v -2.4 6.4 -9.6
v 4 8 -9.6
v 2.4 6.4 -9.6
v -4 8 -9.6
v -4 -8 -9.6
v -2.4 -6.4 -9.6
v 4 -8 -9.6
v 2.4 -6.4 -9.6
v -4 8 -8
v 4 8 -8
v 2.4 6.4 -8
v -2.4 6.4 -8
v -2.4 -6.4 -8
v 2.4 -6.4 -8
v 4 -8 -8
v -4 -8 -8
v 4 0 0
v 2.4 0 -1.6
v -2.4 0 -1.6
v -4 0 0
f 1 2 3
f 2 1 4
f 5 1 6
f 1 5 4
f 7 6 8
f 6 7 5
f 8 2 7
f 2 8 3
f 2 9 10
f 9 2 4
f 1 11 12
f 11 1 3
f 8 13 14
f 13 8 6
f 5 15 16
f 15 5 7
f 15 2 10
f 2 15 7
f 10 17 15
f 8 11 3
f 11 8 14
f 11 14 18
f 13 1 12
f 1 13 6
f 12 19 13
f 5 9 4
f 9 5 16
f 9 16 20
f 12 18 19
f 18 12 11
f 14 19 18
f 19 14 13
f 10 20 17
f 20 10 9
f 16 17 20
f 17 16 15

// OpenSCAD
// file: ../p/4-4edge.scad
use <../lib.scad>
$fa=1; $fs=0.2;
function ldraw_lib__4_4edge(realsolid=false) = [
// 0 Circle 1.0
// 0 Name: 4-4edge.dat
// 0 Author: James Jessiman
// 0 !LDRAW_ORG Primitive UPDATE 2017-01
// 0 !LICENSE Licensed under CC BY 2.0 and CC BY 4.0 : see CAreadme.txt
// 
// 0 BFC CERTIFY CCW
  [0,"BFC","CERTIFY"],
  [0,"BFC","CCW"],
// 
// 0 !HISTORY 1998-12-15 [PTadmin] Official Update 1998-10
// 0 !HISTORY 2005-12-28 [PTadmin] Official Update 2005-01
// 0 !HISTORY 2007-06-24 [PTadmin] Header formatted for Contributor Agreement
// 0 !HISTORY 2008-07-01 [PTadmin] Official Update 2008-01
// 0 !HISTORY 2017-01-15 [Steffen] BFCed
// 0 !HISTORY 2017-12-30 [PTadmin] Official Update 2017-01
// 
// 
// 2 24 1 0 0 0.9239 0 0.3827
  [2,24,1,0,0,0.9239,0,0.3827],
// 2 24 0.9239 0 0.3827 0.7071 0 0.7071
  [2,24,0.9239,0,0.3827,0.7071,0,0.7071],
// 2 24 0.7071 0 0.7071 0.3827 0 0.9239
  [2,24,0.7071,0,0.7071,0.3827,0,0.9239],
// 2 24 0.3827 0 0.9239 0 0 1
  [2,24,0.3827,0,0.9239,0,0,1],
// 2 24 0 0 1 -0.3827 0 0.9239
  [2,24,0,0,1,-0.3827,0,0.9239],
// 2 24 -0.3827 0 0.9239 -0.7071 0 0.7071
  [2,24,-0.3827,0,0.9239,-0.7071,0,0.7071],
// 2 24 -0.7071 0 0.7071 -0.9239 0 0.3827
  [2,24,-0.7071,0,0.7071,-0.9239,0,0.3827],
// 2 24 -0.9239 0 0.3827 -1 0 -0
  [2,24,-0.9239,0,0.3827,-1,0,-0],
// 2 24 -1 0 -0 -0.9239 0 -0.3827
  [2,24,-1,0,-0,-0.9239,0,-0.3827],
// 2 24 -0.9239 0 -0.3827 -0.7071 0 -0.7071
  [2,24,-0.9239,0,-0.3827,-0.7071,0,-0.7071],
// 2 24 -0.7071 0 -0.7071 -0.3827 0 -0.9239
  [2,24,-0.7071,0,-0.7071,-0.3827,0,-0.9239],
// 2 24 -0.3827 0 -0.9239 0 0 -1
  [2,24,-0.3827,0,-0.9239,0,0,-1],
// 2 24 0 0 -1 0.3827 0 -0.9239
  [2,24,0,0,-1,0.3827,0,-0.9239],
// 2 24 0.3827 0 -0.9239 0.7071 0 -0.7071
  [2,24,0.3827,0,-0.9239,0.7071,0,-0.7071],
// 2 24 0.7071 0 -0.7071 0.9239 0 -0.3827
  [2,24,0.7071,0,-0.7071,0.9239,0,-0.3827],
// 2 24 0.9239 0 -0.3827 1 0 0
  [2,24,0.9239,0,-0.3827,1,0,0],
];
module ldraw_lib__4_4edge(step=0, col=false, unit=2/5, alt=false, line=0.2, solid=!$preview)
    makepoly(ldraw_lib__4_4edge(solid), step=step, col=col, unit=unit, alt=alt, line=line, solid=solid);
ldraw_lib__4_4edge(line=0.2);
// file: ../p/4-4disc.scad
use <../lib.scad>
$fa=1; $fs=0.2;
function ldraw_lib__4_4disc(realsolid=false) = [
// 0 Disc 1.0
// 0 Name: 4-4disc.dat
// 0 Author: James Jessiman
// 0 !LDRAW_ORG Primitive UPDATE 2002-02
// 0 !LICENSE Licensed under CC BY 2.0 and CC BY 4.0 : see CAreadme.txt
// 
// 0 BFC CERTIFY CCW
  [0,"BFC","CERTIFY"],
  [0,"BFC","CCW"],
// 
// 0 !HISTORY 1998-12-15 [PTadmin] Official Update 1998-10
// 0 !HISTORY 2002-03-23 [sbliss] Added BFC statement
// 0 !HISTORY 2002-04-25 [PTadmin] Official Update 2002-02
// 0 !HISTORY 2007-06-24 [PTadmin] Header formatted for Contributor Agreement
// 0 !HISTORY 2008-07-01 [PTadmin] Official Update 2008-01
// 
// 
// 3 16 0 0 0 1 0 0 0.9239 0 0.3827
  [3,16,0,0,0,1,0,0,0.9239,0,0.3827],
// 3 16 0 0 0 0.9239 0 0.3827 0.7071 0 0.7071
  [3,16,0,0,0,0.9239,0,0.3827,0.7071,0,0.7071],
// 3 16 0 0 0 0.7071 0 0.7071 0.3827 0 0.9239
  [3,16,0,0,0,0.7071,0,0.7071,0.3827,0,0.9239],
// 3 16 0 0 0 0.3827 0 0.9239 0 0 1
  [3,16,0,0,0,0.3827,0,0.9239,0,0,1],
// 3 16 0 0 0 0 0 1 -0.3827 0 0.9239
  [3,16,0,0,0,0,0,1,-0.3827,0,0.9239],
// 3 16 0 0 0 -0.3827 0 0.9239 -0.7071 0 0.7071
  [3,16,0,0,0,-0.3827,0,0.9239,-0.7071,0,0.7071],
// 3 16 0 0 0 -0.7071 0 0.7071 -0.9239 0 0.3827
  [3,16,0,0,0,-0.7071,0,0.7071,-0.9239,0,0.3827],
// 3 16 0 0 0 -0.9239 0 0.3827 -1 0 -0
  [3,16,0,0,0,-0.9239,0,0.3827,-1,0,-0],
// 3 16 0 0 0 -1 0 -0 -0.9239 0 -0.3827
  [3,16,0,0,0,-1,0,-0,-0.9239,0,-0.3827],
// 3 16 0 0 0 -0.9239 0 -0.3827 -0.7071 0 -0.7071
  [3,16,0,0,0,-0.9239,0,-0.3827,-0.7071,0,-0.7071],
// 3 16 0 0 0 -0.7071 0 -0.7071 -0.3827 0 -0.9239
  [3,16,0,0,0,-0.7071,0,-0.7071,-0.3827,0,-0.9239],
// 3 16 0 0 0 -0.3827 0 -0.9239 0 0 -1
  [3,16,0,0,0,-0.3827,0,-0.9239,0,0,-1],
// 3 16 0 0 0 0 0 -1 0.3827 0 -0.9239
  [3,16,0,0,0,0,0,-1,0.3827,0,-0.9239],
// 3 16 0 0 0 0.3827 0 -0.9239 0.7071 0 -0.7071
  [3,16,0,0,0,0.3827,0,-0.9239,0.7071,0,-0.7071],
// 3 16 0 0 0 0.7071 0 -0.7071 0.9239 0 -0.3827
  [3,16,0,0,0,0.7071,0,-0.7071,0.9239,0,-0.3827],
// 3 16 0 0 0 0.9239 0 -0.3827 1 0 0
  [3,16,0,0,0,0.9239,0,-0.3827,1,0,0],
// 0
];
module ldraw_lib__4_4disc(step=0, col=false, unit=2/5, alt=false, line=0.2, solid=!$preview)
    makepoly(ldraw_lib__4_4disc(solid), step=step, col=col, unit=unit, alt=alt, line=line, solid=solid);
ldraw_lib__4_4disc(line=0.2);
// file: ../p/4-4cyli.scad
use <../lib.scad>
$fa=1; $fs=0.2;
function ldraw_lib__4_4cyli(realsolid=false) = [
// 0 Cylinder 1.0
// 0 Name: 4-4cyli.dat
// 0 Author: James Jessiman
// 0 !LDRAW_ORG Primitive UPDATE 2005-01
// 0 !LICENSE Licensed under CC BY 2.0 and CC BY 4.0 : see CAreadme.txt
// 
// 0 BFC CERTIFY CCW
  [0,"BFC","CERTIFY"],
  [0,"BFC","CCW"],
// 
// 0 !HISTORY 1998-12-15 [PTadmin] Official Update 1998-10
// 0 !HISTORY 2002-03-23 [sbliss] Added BFC statement; merged headers from files in distributions LDraw 0.27 and Complete.
// 0 !HISTORY 2002-04-25 [PTadmin] Official Update 2002-02
// 0 !HISTORY 2004-12-14 [guyvivan] BFC CCW
// 0 !HISTORY 2005-12-28 [PTadmin] Official Update 2005-01
// 0 !HISTORY 2007-06-24 [PTadmin] Header formatted for Contributor Agreement
// 0 !HISTORY 2008-07-01 [PTadmin] Official Update 2008-01
// 
// 
// 4 16 1 1 0 0.9239 1 0.3827 0.9239 0 0.3827 1 0 0
  [4,16,1,1,0,0.9239,1,0.3827,0.9239,0,0.3827,1,0,0],
// 5 24 1 0 0 1 1 0 0.9239 0 0.3827 0.9239 0 -0.3827
  [5,24,1,0,0,1,1,0,0.9239,0,0.3827,0.9239,0,-0.3827],
// 4 16 0.9239 1 0.3827 0.7071 1 0.7071 0.7071 0 0.7071 0.9239 0 0.3827
  [4,16,0.9239,1,0.3827,0.7071,1,0.7071,0.7071,0,0.7071,0.9239,0,0.3827],
// 5 24 0.9239 0 0.3827 0.9239 1 0.3827 0.7071 0 0.7071 1 0 0
  [5,24,0.9239,0,0.3827,0.9239,1,0.3827,0.7071,0,0.7071,1,0,0],
// 4 16 0.7071 1 0.7071 0.3827 1 0.9239 0.3827 0 0.9239 0.7071 0 0.7071
  [4,16,0.7071,1,0.7071,0.3827,1,0.9239,0.3827,0,0.9239,0.7071,0,0.7071],
// 5 24 0.7071 0 0.7071 0.7071 1 0.7071 0.3827 0 0.9239 0.9239 0 0.3827
  [5,24,0.7071,0,0.7071,0.7071,1,0.7071,0.3827,0,0.9239,0.9239,0,0.3827],
// 4 16 0.3827 1 0.9239 0 1 1 0 0 1 0.3827 0 0.9239
  [4,16,0.3827,1,0.9239,0,1,1,0,0,1,0.3827,0,0.9239],
// 5 24 0.3827 0 0.9239 0.3827 1 0.9239 0 0 1 0.7071 0 0.7071
  [5,24,0.3827,0,0.9239,0.3827,1,0.9239,0,0,1,0.7071,0,0.7071],
// 4 16 0 1 1 -0.3827 1 0.9239 -0.3827 0 0.9239 0 0 1
  [4,16,0,1,1,-0.3827,1,0.9239,-0.3827,0,0.9239,0,0,1],
// 5 24 0 0 1 0 1 1 -0.3827 0 0.9239 0.3827 0 0.9239
  [5,24,0,0,1,0,1,1,-0.3827,0,0.9239,0.3827,0,0.9239],
// 4 16 -0.3827 1 0.9239 -0.7071 1 0.7071 -0.7071 0 0.7071 -0.3827 0 0.9239
  [4,16,-0.3827,1,0.9239,-0.7071,1,0.7071,-0.7071,0,0.7071,-0.3827,0,0.9239],
// 5 24 -0.3827 0 0.9239 -0.3827 1 0.9239 -0.7071 0 0.7071 0 0 1
  [5,24,-0.3827,0,0.9239,-0.3827,1,0.9239,-0.7071,0,0.7071,0,0,1],
// 4 16 -0.7071 1 0.7071 -0.9239 1 0.3827 -0.9239 0 0.3827 -0.7071 0 0.7071
  [4,16,-0.7071,1,0.7071,-0.9239,1,0.3827,-0.9239,0,0.3827,-0.7071,0,0.7071],
// 5 24 -0.7071 0 0.7071 -0.7071 1 0.7071 -0.9239 0 0.3827 -0.3827 0 0.9239
  [5,24,-0.7071,0,0.7071,-0.7071,1,0.7071,-0.9239,0,0.3827,-0.3827,0,0.9239],
// 4 16 -0.9239 1 0.3827 -1 1 0 -1 0 0 -0.9239 0 0.3827
  [4,16,-0.9239,1,0.3827,-1,1,0,-1,0,0,-0.9239,0,0.3827],
// 5 24 -0.9239 0 0.3827 -0.9239 1 0.3827 -1 0 0 -0.7071 0 0.7071
  [5,24,-0.9239,0,0.3827,-0.9239,1,0.3827,-1,0,0,-0.7071,0,0.7071],
// 4 16 -1 1 0 -0.9239 1 -0.3827 -0.9239 0 -0.3827 -1 0 0
  [4,16,-1,1,0,-0.9239,1,-0.3827,-0.9239,0,-0.3827,-1,0,0],
// 5 24 -1 0 0 -1 1 0 -0.9239 0 -0.3827 -0.9239 0 0.3827
  [5,24,-1,0,0,-1,1,0,-0.9239,0,-0.3827,-0.9239,0,0.3827],
// 4 16 -0.9239 1 -0.3827 -0.7071 1 -0.7071 -0.7071 0 -0.7071 -0.9239 0 -0.3827
  [4,16,-0.9239,1,-0.3827,-0.7071,1,-0.7071,-0.7071,0,-0.7071,-0.9239,0,-0.3827],
// 5 24 -0.9239 0 -0.3827 -0.9239 1 -0.3827 -0.7071 0 -0.7071 -1 0 0
  [5,24,-0.9239,0,-0.3827,-0.9239,1,-0.3827,-0.7071,0,-0.7071,-1,0,0],
// 4 16 -0.7071 1 -0.7071 -0.3827 1 -0.9239 -0.3827 0 -0.9239 -0.7071 0 -0.7071
  [4,16,-0.7071,1,-0.7071,-0.3827,1,-0.9239,-0.3827,0,-0.9239,-0.7071,0,-0.7071],
// 5 24 -0.7071 0 -0.7071 -0.7071 1 -0.7071 -0.3827 0 -0.9239 -0.9239 0 -0.3827
  [5,24,-0.7071,0,-0.7071,-0.7071,1,-0.7071,-0.3827,0,-0.9239,-0.9239,0,-0.3827],
// 4 16 -0.3827 1 -0.9239 0 1 -1 0 0 -1 -0.3827 0 -0.9239
  [4,16,-0.3827,1,-0.9239,0,1,-1,0,0,-1,-0.3827,0,-0.9239],
// 5 24 -0.3827 0 -0.9239 -0.3827 1 -0.9239 0 0 -1 -0.7071 0 -0.7071
  [5,24,-0.3827,0,-0.9239,-0.3827,1,-0.9239,0,0,-1,-0.7071,0,-0.7071],
// 4 16 0 1 -1 0.3827 1 -0.9239 0.3827 0 -0.9239 0 0 -1
  [4,16,0,1,-1,0.3827,1,-0.9239,0.3827,0,-0.9239,0,0,-1],
// 5 24 0 0 -1 0 1 -1 0.3827 0 -0.9239 -0.3827 0 -0.9239
  [5,24,0,0,-1,0,1,-1,0.3827,0,-0.9239,-0.3827,0,-0.9239],
// 4 16 0.3827 1 -0.9239 0.7071 1 -0.7071 0.7071 0 -0.7071 0.3827 0 -0.9239
  [4,16,0.3827,1,-0.9239,0.7071,1,-0.7071,0.7071,0,-0.7071,0.3827,0,-0.9239],
// 5 24 0.3827 0 -0.9239 0.3827 1 -0.9239 0.7071 0 -0.7071 0 0 -1
  [5,24,0.3827,0,-0.9239,0.3827,1,-0.9239,0.7071,0,-0.7071,0,0,-1],
// 4 16 0.7071 1 -0.7071 0.9239 1 -0.3827 0.9239 0 -0.3827 0.7071 0 -0.7071
  [4,16,0.7071,1,-0.7071,0.9239,1,-0.3827,0.9239,0,-0.3827,0.7071,0,-0.7071],
// 5 24 0.7071 0 -0.7071 0.7071 1 -0.7071 0.9239 0 -0.3827 0.3827 0 -0.9239
  [5,24,0.7071,0,-0.7071,0.7071,1,-0.7071,0.9239,0,-0.3827,0.3827,0,-0.9239],
// 4 16 0.9239 1 -0.3827 1 1 0 1 0 0 0.9239 0 -0.3827
  [4,16,0.9239,1,-0.3827,1,1,0,1,0,0,0.9239,0,-0.3827],
// 5 24 0.9239 0 -0.3827 0.9239 1 -0.3827 1 0 0 0.7071 0 -0.7071
  [5,24,0.9239,0,-0.3827,0.9239,1,-0.3827,1,0,0,0.7071,0,-0.7071],
// 0
];
module ldraw_lib__4_4cyli(step=0, col=false, unit=2/5, alt=false, line=0.2, solid=!$preview)
    makepoly(ldraw_lib__4_4cyli(solid), step=step, col=col, unit=unit, alt=alt, line=line, solid=solid);
ldraw_lib__4_4cyli(line=0.2);
// file: ../p/stud3.scad
use <../lib.scad>
use <4-4cyli.scad>
use <4-4disc.scad>
use <4-4edge.scad>
$fa=1; $fs=0.2;
function ldraw_lib__stud3(realsolid=false) = realsolid ? 
    [openscad(translate([0,0,-eps()], o=cylinder(4+eps(), r=4)),2)] : [
// 0 Stud Tube Solid
// 0 Name: stud3.dat
// 0 Author: James Jessiman
// 0 !LDRAW_ORG Primitive UPDATE 2012-01
// 0 !LICENSE Licensed under CC BY 2.0 and CC BY 4.0 : see CAreadme.txt
// 
// 0 BFC CERTIFY CCW
  [0,"BFC","CERTIFY"],
  [0,"BFC","CCW"],
// 
// 0 !HISTORY 2002-04-04 [sbliss] Modified for BFC compliance
// 0 !HISTORY 2002-04-25 [PTadmin] Official Update 2002-02
// 0 !HISTORY 2007-06-24 [PTadmin] Header formatted for Contributor Agreement
// 0 !HISTORY 2008-07-01 [PTadmin] Official Update 2008-01
// 0 !HISTORY 2012-02-16 [Philo] Changed to CCW
// 0 !HISTORY 2012-03-30 [PTadmin] Official Update 2012-01
// 
// 
// 1 16 0 -4 0 4 0 0 0 1 0 0 0 4 4-4edge.dat
  [1,16,0,-4,0,4,0,0,0,1,0,0,0,4, ldraw_lib__4_4edge(realsolid)],
// 1 16 0 0 0 4 0 0 0 1 0 0 0 4 4-4edge.dat
  [1,16,0,0,0,4,0,0,0,1,0,0,0,4, ldraw_lib__4_4edge(realsolid)],
// 1 16 0 -4 0 4 0 0 0 1 0 0 0 4 4-4disc.dat
  [1,16,0,-4,0,4,0,0,0,1,0,0,0,4, ldraw_lib__4_4disc(realsolid)],
// 1 16 0 -4 0 4 0 0 0 4 0 0 0 4 4-4cyli.dat
  [1,16,0,-4,0,4,0,0,0,4,0,0,0,4, ldraw_lib__4_4cyli(realsolid)],
];
module ldraw_lib__stud3(step=0, col=false, unit=2/5, alt=false, line=0.2, solid=!$preview)
    makepoly(ldraw_lib__stud3(solid), step=step, col=col, unit=unit, alt=alt, line=line, solid=solid);
ldraw_lib__stud3(line=0.2);
// file: ../p/stud.scad
use <../lib.scad>
use <4-4cyli.scad>
use <4-4disc.scad>
use <4-4edge.scad>
$fa=1; $fs=0.2;
function ldraw_lib__stud(realsolid=false) = realsolid ? 
    [openscad(translate([0,0,-eps()], o=cylinder(4+eps(), r=6)),2)] : [
// 0 Stud
// 0 Name: stud.dat
// 0 Author: James Jessiman
// 0 !LDRAW_ORG Primitive UPDATE 2012-01
// 0 !LICENSE Licensed under CC BY 2.0 and CC BY 4.0 : see CAreadme.txt
// 
// 0 BFC CERTIFY CCW
  [0,"BFC","CERTIFY"],
  [0,"BFC","CCW"],
// 
// 0 !HISTORY 2002-04-04 [sbliss] Modified for BFC compliance
// 0 !HISTORY 2002-04-25 [PTadmin] Official Update 2002-02
// 0 !HISTORY 2007-06-24 [PTadmin] Header formatted for Contributor Agreement
// 0 !HISTORY 2008-07-01 [PTadmin] Official Update 2008-01
// 0 !HISTORY 2012-02-16 [Philo] Changed to CCW
// 0 !HISTORY 2012-03-30 [PTadmin] Official Update 2012-01
// 
// 
// 1 16 0 0 0 6 0 0 0 1 0 0 0 6 4-4edge.dat
  [1,16,0,0,0,6,0,0,0,1,0,0,0,6, ldraw_lib__4_4edge(realsolid)],
// 1 16 0 -4 0 6 0 0 0 1 0 0 0 6 4-4edge.dat
  [1,16,0,-4,0,6,0,0,0,1,0,0,0,6, ldraw_lib__4_4edge(realsolid)],
// 1 16 0 0 0 6 0 0 0 -4 0 0 0 6 4-4cyli.dat
  [1,16,0,0,0,6,0,0,0,-4,0,0,0,6, ldraw_lib__4_4cyli(realsolid)],
// 1 16 0 -4 0 6 0 0 0 1 0 0 0 6 4-4disc.dat
  [1,16,0,-4,0,6,0,0,0,1,0,0,0,6, ldraw_lib__4_4disc(realsolid)],
];
module ldraw_lib__stud(step=0, col=false, unit=2/5, alt=false, line=0.2, solid=!$preview)
    makepoly(ldraw_lib__stud(solid), step=step, col=col, unit=unit, alt=alt, line=line, solid=solid);
ldraw_lib__stud(line=0.2);
// file: ../p/box5.scad
use <../lib.scad>
$fa=1; $fs=0.2;
function ldraw_lib__box5(realsolid=false) = [
// 0 Box with 5 Faces and All Edges
// 0 Name: box5.dat
// 0 Author: James Jessiman
// 0 !LDRAW_ORG Primitive UPDATE 2012-01
// 0 !LICENSE Licensed under CC BY 2.0 and CC BY 4.0 : see CAreadme.txt
// 
// 0 BFC CERTIFY CCW
  [0,"BFC","CERTIFY"],
  [0,"BFC","CCW"],
// 
// 0 !HISTORY 2002-04-03 [sbliss] Modified for BFC compliance
// 0 !HISTORY 2002-04-25 [PTadmin] Official Update 2002-02
// 0 !HISTORY 2007-06-24 [PTadmin] Header formatted for Contributor Agreement
// 0 !HISTORY 2008-07-01 [PTadmin] Official Update 2008-01
// 0 !HISTORY 2012-02-16 [Philo] Changed to CCW
// 0 !HISTORY 2012-03-30 [PTadmin] Official Update 2012-01
// 
// 
// 2 24 1 1 1 -1 1 1
  [2,24,1,1,1,-1,1,1],
// 2 24 -1 1 1 -1 1 -1
  [2,24,-1,1,1,-1,1,-1],
// 2 24 -1 1 -1 1 1 -1
  [2,24,-1,1,-1,1,1,-1],
// 2 24 1 1 -1 1 1 1
  [2,24,1,1,-1,1,1,1],
// 2 24 1 0 1 -1 0 1
  [2,24,1,0,1,-1,0,1],
// 2 24 -1 0 1 -1 0 -1
  [2,24,-1,0,1,-1,0,-1],
// 2 24 -1 0 -1 1 0 -1
  [2,24,-1,0,-1,1,0,-1],
// 2 24 1 0 -1 1 0 1
  [2,24,1,0,-1,1,0,1],
// 2 24 1 0 1 1 1 1
  [2,24,1,0,1,1,1,1],
// 2 24 -1 0 1 -1 1 1
  [2,24,-1,0,1,-1,1,1],
// 2 24 1 0 -1 1 1 -1
  [2,24,1,0,-1,1,1,-1],
// 2 24 -1 0 -1 -1 1 -1
  [2,24,-1,0,-1,-1,1,-1],
// 4 16 -1 1 1 1 1 1 1 1 -1 -1 1 -1
  [4,16,-1,1,1,1,1,1,1,1,-1,-1,1,-1],
// 4 16 -1 1 1 -1 0 1 1 0 1 1 1 1
  [4,16,-1,1,1,-1,0,1,1,0,1,1,1,1],
// 4 16 -1 1 -1 -1 0 -1 -1 0 1 -1 1 1
  [4,16,-1,1,-1,-1,0,-1,-1,0,1,-1,1,1],
// 4 16 1 1 -1 1 0 -1 -1 0 -1 -1 1 -1
  [4,16,1,1,-1,1,0,-1,-1,0,-1,-1,1,-1],
// 4 16 1 1 1 1 0 1 1 0 -1 1 1 -1
  [4,16,1,1,1,1,0,1,1,0,-1,1,1,-1],
];
module ldraw_lib__box5(step=0, col=false, unit=2/5, alt=false, line=0.2, solid=!$preview)
    makepoly(ldraw_lib__box5(solid), step=step, col=col, unit=unit, alt=alt, line=line, solid=solid);
ldraw_lib__box5(line=0.2);
// file: ../p/box4t.scad
use <../lib.scad>
$fa=1; $fs=0.2;
function ldraw_lib__box4t(realsolid=false) = [
// 0 Box with 4 Adjacent Faces and All Edges
// 0 Name: box4t.dat
// 0 Author: Tore Eriksson [Tore_Eriksson]
// 0 !LDRAW_ORG Primitive UPDATE 2003-02
// 0 !LICENSE Licensed under CC BY 2.0 and CC BY 4.0 : see CAreadme.txt
// 
// 0 BFC CERTIFY CCW
  [0,"BFC","CERTIFY"],
  [0,"BFC","CCW"],
// 
// 0 !HISTORY 1997-09-29 [PTadmin] Official Update 1997-15
// 0 !HISTORY 2002-08-31 [izanette] Modified with WINDZ for BFC compliance
// 0 !HISTORY 2003-08-01 [PTadmin] Official Update 2003-02
// 0 !HISTORY 2007-06-24 [PTadmin] Header formatted for Contributor Agreement
// 0 !HISTORY 2008-07-01 [PTadmin] Official Update 2008-01
// 
// 
// 2 24 1 1 1 -1 1 1
  [2,24,1,1,1,-1,1,1],
// 2 24 -1 1 1 -1 1 -1
  [2,24,-1,1,1,-1,1,-1],
// 2 24 -1 1 -1 1 1 -1
  [2,24,-1,1,-1,1,1,-1],
// 2 24 1 1 -1 1 1 1
  [2,24,1,1,-1,1,1,1],
// 2 24 1 0 1 -1 0 1
  [2,24,1,0,1,-1,0,1],
// 2 24 -1 0 1 -1 0 -1
  [2,24,-1,0,1,-1,0,-1],
// 2 24 -1 0 -1 1 0 -1
  [2,24,-1,0,-1,1,0,-1],
// 2 24 1 0 -1 1 0 1
  [2,24,1,0,-1,1,0,1],
// 2 24 1 0 1 1 1 1
  [2,24,1,0,1,1,1,1],
// 2 24 -1 0 1 -1 1 1
  [2,24,-1,0,1,-1,1,1],
// 2 24 1 0 -1 1 1 -1
  [2,24,1,0,-1,1,1,-1],
// 2 24 -1 0 -1 -1 1 -1
  [2,24,-1,0,-1,-1,1,-1],
// 4 16 1 1 1 1 1 -1 -1 1 -1 -1 1 1
  [4,16,1,1,1,1,1,-1,-1,1,-1,-1,1,1],
// 4 16 1 1 1 -1 1 1 -1 0 1 1 0 1
  [4,16,1,1,1,-1,1,1,-1,0,1,1,0,1],
// 4 16 -1 1 1 -1 1 -1 -1 0 -1 -1 0 1
  [4,16,-1,1,1,-1,1,-1,-1,0,-1,-1,0,1],
// 0 4 16 -1 1 -1 -1 0 -1 1 0 -1 1 1 -1
// 4 16 1 1 -1 1 1 1 1 0 1 1 0 -1
  [4,16,1,1,-1,1,1,1,1,0,1,1,0,-1],
// 0
];
module ldraw_lib__box4t(step=0, col=false, unit=2/5, alt=false, line=0.2, solid=!$preview)
    makepoly(ldraw_lib__box4t(solid), step=step, col=col, unit=unit, alt=alt, line=line, solid=solid);
ldraw_lib__box4t(line=0.2);
// file: s/3004s01.scad
use <../../lib.scad>
use <../../p/box4t.scad>
use <../../p/box5.scad>
use <../../p/stud.scad>
use <../../p/stud3.scad>
$fa=1; $fs=0.2;
function ldraw_lib__s__3004s01(realsolid=false) = [
// 0 ~Brick  1 x  2 without Front Face
// 0 Name: s\3004s01.dat
// 0 Author: James Jessiman
// 0 !LDRAW_ORG Subpart UPDATE 2003-03
// 0 !LICENSE Licensed under CC BY 2.0 and CC BY 4.0 : see CAreadme.txt
// 
// 0 BFC CERTIFY CCW
  [0,"BFC","CERTIFY"],
  [0,"BFC","CCW"],
// 
// 0 !HISTORY 2003-09-07 [jriley] Subfiling, BFC
// 0 !HISTORY 2003-12-19 [PTadmin] Official Update 2003-03
// 0 !HISTORY 2007-08-29 [PTadmin] Header formatted for Contributor Agreement
// 0 !HISTORY 2008-07-01 [PTadmin] Official Update 2008-01
// 
// 
// 1 16 0 4 0 1 0 0 0 -5 0 0 0 1 stud3.dat
  [1,16,0,4,0,1,0,0,0,-5,0,0,0,1, ldraw_lib__stud3(realsolid)],
// 0 BFC INVERTNEXT
  [0,"BFC","INVERTNEXT"],
// 1 16 0 24 0 16 0 0 0 -20 0 0 0 6 box5.dat
  [1,16,0,24,0,16,0,0,0,-20,0,0,0,6, ldraw_lib__box5(realsolid)],
// 4 16 20 24 10 16 24 6 -16 24 6 -20 24 10
  [4,16,20,24,10,16,24,6,-16,24,6,-20,24,10],
// 4 16 -20 24 10 -16 24 6 -16 24 -6 -20 24 -10
  [4,16,-20,24,10,-16,24,6,-16,24,-6,-20,24,-10],
// 4 16 -20 24 -10 -16 24 -6 16 24 -6 20 24 -10
  [4,16,-20,24,-10,-16,24,-6,16,24,-6,20,24,-10],
// 4 16 20 24 -10 16 24 -6 16 24 6 20 24 10
  [4,16,20,24,-10,16,24,-6,16,24,6,20,24,10],
// 1 16 0 24 0 20 0 0 0 -24 0 0 0 10 box4t.dat
  [1,16,0,24,0,20,0,0,0,-24,0,0,0,10, ldraw_lib__box4t(realsolid)],
// 1 16 10 0 0 1 0 0 0 1 0 0 0 1 stud.dat
  [1,16,10,0,0,1,0,0,0,1,0,0,0,1, ldraw_lib__stud(realsolid)],
// 1 16 -10 0 0 1 0 0 0 1 0 0 0 1 stud.dat
  [1,16,-10,0,0,1,0,0,0,1,0,0,0,1, ldraw_lib__stud(realsolid)],
// 0
];
module ldraw_lib__s__3004s01(step=0, col=false, unit=2/5, alt=false, line=0.2, solid=!$preview)
    makepoly(ldraw_lib__s__3004s01(solid), step=step, col=col, unit=unit, alt=alt, line=line, solid=solid);
ldraw_lib__s__3004s01(line=0.2);
// file: 3004.scad
use <../lib.scad>
use <s/3004s01.scad>
$fa=1; $fs=0.2;
function ldraw_lib__3004(realsolid=false) = [
// 0 Brick  1 x  2
// 0 Name: 3004.dat
// 0 Author: James Jessiman
// 0 !LDRAW_ORG Part UPDATE 2022-05
// 0 !LICENSE Licensed under CC BY 2.0 and CC BY 4.0 : see CAreadme.txt
// 
// 0 BFC CERTIFY CCW
  [0,"BFC","CERTIFY"],
  [0,"BFC","CCW"],
// 
// 0 !HISTORY 2001-10-26 [PTadmin] Official Update 2001-01
// 0 !HISTORY 2002-05-07 {unknown} BFC Certification
// 0 !HISTORY 2002-06-11 [PTadmin] Official Update 2002-03
// 0 !HISTORY 2007-05-07 [PTadmin] Header formatted for Contributor Agreement
// 0 !HISTORY 2008-07-01 [PTadmin] Official Update 2008-01
// 0 !HISTORY 2022-08-04 [MagFors] Using subfile
// 0 !HISTORY 2022-09-15 [PTadmin] Official Update 2022-05
// 
// 
// 1 16 0 0 0 1 0 0 0 1 0 0 0 1 s\3004s01.dat
  [1,16,0,0,0,1,0,0,0,1,0,0,0,1, ldraw_lib__s__3004s01(realsolid)],
// 4 16 -20 24 -10 20 24 -10 20 0 -10 -20 0 -10
  [4,16,-20,24,-10,20,24,-10,20,0,-10,-20,0,-10],
];
module ldraw_lib__3004(step=0, col=false, unit=2/5, alt=false, line=0.2, solid=!$preview)
    makepoly(ldraw_lib__3004(solid), step=step, col=col, unit=unit, alt=alt, line=line, solid=solid);
ldraw_lib__3004(line=0.2);
// main file
use <../lib.scad>
$fa=1; $fs=0.2;
function ldraw_lib__3044a(realsolid=false) = [
// 0 Slope Brick 45  2 x  1 Double with Hollow Bottom
// 0 Name: 3044a.dat
// 0 Author: James Mastros [theorbtwo]
// 0 !LDRAW_ORG Part UPDATE 2009-02
// 0 !LICENSE Licensed under CC BY 2.0 and CC BY 4.0 : see CAreadme.txt
// 
// 0 BFC CERTIFY CCW
  [0,"BFC","CERTIFY"],
  [0,"BFC","CCW"],
// 
// 0 !HISTORY 2009-09-03 [PTadmin] Official Update 2009-02
// 
// 
// 2 24 6 24 16 -6 24 16
  [2,24,6,24,16,-6,24,16],
// 2 24 -6 24 16 -6 24 -16
  [2,24,-6,24,16,-6,24,-16],
// 2 24 -6 24 -16 6 24 -16
  [2,24,-6,24,-16,6,24,-16],
// 2 24 6 24 -16 6 24 16
  [2,24,6,24,-16,6,24,16],
// 
// 2 24 10 24 20 -10 24 20
  [2,24,10,24,20,-10,24,20],
// 2 24 -10 24 20 -10 24 -20
  [2,24,-10,24,20,-10,24,-20],
// 2 24 -10 24 -20 10 24 -20
  [2,24,-10,24,-20,10,24,-20],
// 2 24 10 24 -20 10 24 20
  [2,24,10,24,-20,10,24,20],
// 
// 2 24 6 24 16 6 20 16
  [2,24,6,24,16,6,20,16],
// 2 24 -6 24 16 -6 20 16
  [2,24,-6,24,16,-6,20,16],
// 2 24 6 24 -16 6 20 -16
  [2,24,6,24,-16,6,20,-16],
// 2 24 -6 24 -16 -6 20 -16
  [2,24,-6,24,-16,-6,20,-16],
// 2 24 6 20 16 -6 20 16
  [2,24,6,20,16,-6,20,16],
// 2 24 6 4 0 -6 4 0
  [2,24,6,4,0,-6,4,0],
// 2 24 6 20 -16 -6 20 -16
  [2,24,6,20,-16,-6,20,-16],
// 2 24 6 20 16 6 4 0
  [2,24,6,20,16,6,4,0],
// 2 24 -6 20 16 -6 4 0
  [2,24,-6,20,16,-6,4,0],
// 2 24 6 20 -16 6 4 0
  [2,24,6,20,-16,6,4,0],
// 2 24 -6 20 -16 -6 4 0
  [2,24,-6,20,-16,-6,4,0],
// 
// 2 24 10 24 20 10 20 20
  [2,24,10,24,20,10,20,20],
// 2 24 -10 24 20 -10 20 20
  [2,24,-10,24,20,-10,20,20],
// 2 24 10 24 -20 10 20 -20
  [2,24,10,24,-20,10,20,-20],
// 2 24 -10 24 -20 -10 20 -20
  [2,24,-10,24,-20,-10,20,-20],
// 2 24 10 20 20 -10 20 20
  [2,24,10,20,20,-10,20,20],
// 2 24 10 0 0 -10 0 0
  [2,24,10,0,0,-10,0,0],
// 2 24 10 20 -20 -10 20 -20
  [2,24,10,20,-20,-10,20,-20],
// 2 24 10 20 20 10 0 0
  [2,24,10,20,20,10,0,0],
// 2 24 -10 20 20 -10 0 0
  [2,24,-10,20,20,-10,0,0],
// 2 24 10 20 -20 10 0 0
  [2,24,10,20,-20,10,0,0],
// 2 24 -10 20 -20 -10 0 0
  [2,24,-10,20,-20,-10,0,0],
// 
// 4 16 10 24 20 6 24 16 -6 24 16 -10 24 20
  [4,16,10,24,20,6,24,16,-6,24,16,-10,24,20],
// 4 16 -10 24 20 -6 24 16 -6 24 -16 -10 24 -20
  [4,16,-10,24,20,-6,24,16,-6,24,-16,-10,24,-20],
// 4 16 -10 24 -20 -6 24 -16 6 24 -16 10 24 -20
  [4,16,-10,24,-20,-6,24,-16,6,24,-16,10,24,-20],
// 4 16 10 24 -20 6 24 -16 6 24 16 10 24 20
  [4,16,10,24,-20,6,24,-16,6,24,16,10,24,20],
// 
// 4 16 10 24 20 -10 24 20 -10 20 20 10 20 20
  [4,16,10,24,20,-10,24,20,-10,20,20,10,20,20],
// 4 16 6 24 16 6 20 16 -6 20 16 -6 24 16
  [4,16,6,24,16,6,20,16,-6,20,16,-6,24,16],
// 4 16 6 24 -16 -6 24 -16 -6 20 -16 6 20 -16
  [4,16,6,24,-16,-6,24,-16,-6,20,-16,6,20,-16],
// 4 16 10 24 -20 10 20 -20 -10 20 -20 -10 24 -20
  [4,16,10,24,-20,10,20,-20,-10,20,-20,-10,24,-20],
// 
// 4 16 10 24 20 10 20 20 10 20 -20 10 24 -20
  [4,16,10,24,20,10,20,20,10,20,-20,10,24,-20],
// 3 16 10 20 20 10 0 0 10 20 -20
  [3,16,10,20,20,10,0,0,10,20,-20],
// 4 16 6 24 16 6 24 -16 6 20 -16 6 20 16
  [4,16,6,24,16,6,24,-16,6,20,-16,6,20,16],
// 3 16 6 20 16 6 20 -16 6 4 0
  [3,16,6,20,16,6,20,-16,6,4,0],
// 4 16 -6 24 16 -6 20 16 -6 20 -16 -6 24 -16
  [4,16,-6,24,16,-6,20,16,-6,20,-16,-6,24,-16],
// 3 16 -6 20 16 -6 4 0 -6 20 -16
  [3,16,-6,20,16,-6,4,0,-6,20,-16],
// 4 16 -10 24 20 -10 24 -20 -10 20 -20 -10 20 20
  [4,16,-10,24,20,-10,24,-20,-10,20,-20,-10,20,20],
// 3 16 -10 20 20 -10 20 -20 -10 0 0
  [3,16,-10,20,20,-10,20,-20,-10,0,0],
// 
// 4 16 6 20 16 6 4 0 -6 4 0 -6 20 16
  [4,16,6,20,16,6,4,0,-6,4,0,-6,20,16],
// 4 16 6 20 -16 -6 20 -16 -6 4 0 6 4 0
  [4,16,6,20,-16,-6,20,-16,-6,4,0,6,4,0],
// 
// 4 16 10 20 20 -10 20 20 -10 0 0 10 0 0
  [4,16,10,20,20,-10,20,20,-10,0,0,10,0,0],
// 4 16 10 20 -20 10 0 0 -10 0 0 -10 20 -20
  [4,16,10,20,-20,10,0,0,-10,0,0,-10,20,-20],
// 0
];
module ldraw_lib__3044a(step=0, col=false, unit=2/5, alt=false, line=0.2, solid=!$preview)
    makepoly(ldraw_lib__3044a(solid), step=step, col=col, unit=unit, alt=alt, line=line, solid=solid);
ldraw_lib__3044a(line=0.2);
